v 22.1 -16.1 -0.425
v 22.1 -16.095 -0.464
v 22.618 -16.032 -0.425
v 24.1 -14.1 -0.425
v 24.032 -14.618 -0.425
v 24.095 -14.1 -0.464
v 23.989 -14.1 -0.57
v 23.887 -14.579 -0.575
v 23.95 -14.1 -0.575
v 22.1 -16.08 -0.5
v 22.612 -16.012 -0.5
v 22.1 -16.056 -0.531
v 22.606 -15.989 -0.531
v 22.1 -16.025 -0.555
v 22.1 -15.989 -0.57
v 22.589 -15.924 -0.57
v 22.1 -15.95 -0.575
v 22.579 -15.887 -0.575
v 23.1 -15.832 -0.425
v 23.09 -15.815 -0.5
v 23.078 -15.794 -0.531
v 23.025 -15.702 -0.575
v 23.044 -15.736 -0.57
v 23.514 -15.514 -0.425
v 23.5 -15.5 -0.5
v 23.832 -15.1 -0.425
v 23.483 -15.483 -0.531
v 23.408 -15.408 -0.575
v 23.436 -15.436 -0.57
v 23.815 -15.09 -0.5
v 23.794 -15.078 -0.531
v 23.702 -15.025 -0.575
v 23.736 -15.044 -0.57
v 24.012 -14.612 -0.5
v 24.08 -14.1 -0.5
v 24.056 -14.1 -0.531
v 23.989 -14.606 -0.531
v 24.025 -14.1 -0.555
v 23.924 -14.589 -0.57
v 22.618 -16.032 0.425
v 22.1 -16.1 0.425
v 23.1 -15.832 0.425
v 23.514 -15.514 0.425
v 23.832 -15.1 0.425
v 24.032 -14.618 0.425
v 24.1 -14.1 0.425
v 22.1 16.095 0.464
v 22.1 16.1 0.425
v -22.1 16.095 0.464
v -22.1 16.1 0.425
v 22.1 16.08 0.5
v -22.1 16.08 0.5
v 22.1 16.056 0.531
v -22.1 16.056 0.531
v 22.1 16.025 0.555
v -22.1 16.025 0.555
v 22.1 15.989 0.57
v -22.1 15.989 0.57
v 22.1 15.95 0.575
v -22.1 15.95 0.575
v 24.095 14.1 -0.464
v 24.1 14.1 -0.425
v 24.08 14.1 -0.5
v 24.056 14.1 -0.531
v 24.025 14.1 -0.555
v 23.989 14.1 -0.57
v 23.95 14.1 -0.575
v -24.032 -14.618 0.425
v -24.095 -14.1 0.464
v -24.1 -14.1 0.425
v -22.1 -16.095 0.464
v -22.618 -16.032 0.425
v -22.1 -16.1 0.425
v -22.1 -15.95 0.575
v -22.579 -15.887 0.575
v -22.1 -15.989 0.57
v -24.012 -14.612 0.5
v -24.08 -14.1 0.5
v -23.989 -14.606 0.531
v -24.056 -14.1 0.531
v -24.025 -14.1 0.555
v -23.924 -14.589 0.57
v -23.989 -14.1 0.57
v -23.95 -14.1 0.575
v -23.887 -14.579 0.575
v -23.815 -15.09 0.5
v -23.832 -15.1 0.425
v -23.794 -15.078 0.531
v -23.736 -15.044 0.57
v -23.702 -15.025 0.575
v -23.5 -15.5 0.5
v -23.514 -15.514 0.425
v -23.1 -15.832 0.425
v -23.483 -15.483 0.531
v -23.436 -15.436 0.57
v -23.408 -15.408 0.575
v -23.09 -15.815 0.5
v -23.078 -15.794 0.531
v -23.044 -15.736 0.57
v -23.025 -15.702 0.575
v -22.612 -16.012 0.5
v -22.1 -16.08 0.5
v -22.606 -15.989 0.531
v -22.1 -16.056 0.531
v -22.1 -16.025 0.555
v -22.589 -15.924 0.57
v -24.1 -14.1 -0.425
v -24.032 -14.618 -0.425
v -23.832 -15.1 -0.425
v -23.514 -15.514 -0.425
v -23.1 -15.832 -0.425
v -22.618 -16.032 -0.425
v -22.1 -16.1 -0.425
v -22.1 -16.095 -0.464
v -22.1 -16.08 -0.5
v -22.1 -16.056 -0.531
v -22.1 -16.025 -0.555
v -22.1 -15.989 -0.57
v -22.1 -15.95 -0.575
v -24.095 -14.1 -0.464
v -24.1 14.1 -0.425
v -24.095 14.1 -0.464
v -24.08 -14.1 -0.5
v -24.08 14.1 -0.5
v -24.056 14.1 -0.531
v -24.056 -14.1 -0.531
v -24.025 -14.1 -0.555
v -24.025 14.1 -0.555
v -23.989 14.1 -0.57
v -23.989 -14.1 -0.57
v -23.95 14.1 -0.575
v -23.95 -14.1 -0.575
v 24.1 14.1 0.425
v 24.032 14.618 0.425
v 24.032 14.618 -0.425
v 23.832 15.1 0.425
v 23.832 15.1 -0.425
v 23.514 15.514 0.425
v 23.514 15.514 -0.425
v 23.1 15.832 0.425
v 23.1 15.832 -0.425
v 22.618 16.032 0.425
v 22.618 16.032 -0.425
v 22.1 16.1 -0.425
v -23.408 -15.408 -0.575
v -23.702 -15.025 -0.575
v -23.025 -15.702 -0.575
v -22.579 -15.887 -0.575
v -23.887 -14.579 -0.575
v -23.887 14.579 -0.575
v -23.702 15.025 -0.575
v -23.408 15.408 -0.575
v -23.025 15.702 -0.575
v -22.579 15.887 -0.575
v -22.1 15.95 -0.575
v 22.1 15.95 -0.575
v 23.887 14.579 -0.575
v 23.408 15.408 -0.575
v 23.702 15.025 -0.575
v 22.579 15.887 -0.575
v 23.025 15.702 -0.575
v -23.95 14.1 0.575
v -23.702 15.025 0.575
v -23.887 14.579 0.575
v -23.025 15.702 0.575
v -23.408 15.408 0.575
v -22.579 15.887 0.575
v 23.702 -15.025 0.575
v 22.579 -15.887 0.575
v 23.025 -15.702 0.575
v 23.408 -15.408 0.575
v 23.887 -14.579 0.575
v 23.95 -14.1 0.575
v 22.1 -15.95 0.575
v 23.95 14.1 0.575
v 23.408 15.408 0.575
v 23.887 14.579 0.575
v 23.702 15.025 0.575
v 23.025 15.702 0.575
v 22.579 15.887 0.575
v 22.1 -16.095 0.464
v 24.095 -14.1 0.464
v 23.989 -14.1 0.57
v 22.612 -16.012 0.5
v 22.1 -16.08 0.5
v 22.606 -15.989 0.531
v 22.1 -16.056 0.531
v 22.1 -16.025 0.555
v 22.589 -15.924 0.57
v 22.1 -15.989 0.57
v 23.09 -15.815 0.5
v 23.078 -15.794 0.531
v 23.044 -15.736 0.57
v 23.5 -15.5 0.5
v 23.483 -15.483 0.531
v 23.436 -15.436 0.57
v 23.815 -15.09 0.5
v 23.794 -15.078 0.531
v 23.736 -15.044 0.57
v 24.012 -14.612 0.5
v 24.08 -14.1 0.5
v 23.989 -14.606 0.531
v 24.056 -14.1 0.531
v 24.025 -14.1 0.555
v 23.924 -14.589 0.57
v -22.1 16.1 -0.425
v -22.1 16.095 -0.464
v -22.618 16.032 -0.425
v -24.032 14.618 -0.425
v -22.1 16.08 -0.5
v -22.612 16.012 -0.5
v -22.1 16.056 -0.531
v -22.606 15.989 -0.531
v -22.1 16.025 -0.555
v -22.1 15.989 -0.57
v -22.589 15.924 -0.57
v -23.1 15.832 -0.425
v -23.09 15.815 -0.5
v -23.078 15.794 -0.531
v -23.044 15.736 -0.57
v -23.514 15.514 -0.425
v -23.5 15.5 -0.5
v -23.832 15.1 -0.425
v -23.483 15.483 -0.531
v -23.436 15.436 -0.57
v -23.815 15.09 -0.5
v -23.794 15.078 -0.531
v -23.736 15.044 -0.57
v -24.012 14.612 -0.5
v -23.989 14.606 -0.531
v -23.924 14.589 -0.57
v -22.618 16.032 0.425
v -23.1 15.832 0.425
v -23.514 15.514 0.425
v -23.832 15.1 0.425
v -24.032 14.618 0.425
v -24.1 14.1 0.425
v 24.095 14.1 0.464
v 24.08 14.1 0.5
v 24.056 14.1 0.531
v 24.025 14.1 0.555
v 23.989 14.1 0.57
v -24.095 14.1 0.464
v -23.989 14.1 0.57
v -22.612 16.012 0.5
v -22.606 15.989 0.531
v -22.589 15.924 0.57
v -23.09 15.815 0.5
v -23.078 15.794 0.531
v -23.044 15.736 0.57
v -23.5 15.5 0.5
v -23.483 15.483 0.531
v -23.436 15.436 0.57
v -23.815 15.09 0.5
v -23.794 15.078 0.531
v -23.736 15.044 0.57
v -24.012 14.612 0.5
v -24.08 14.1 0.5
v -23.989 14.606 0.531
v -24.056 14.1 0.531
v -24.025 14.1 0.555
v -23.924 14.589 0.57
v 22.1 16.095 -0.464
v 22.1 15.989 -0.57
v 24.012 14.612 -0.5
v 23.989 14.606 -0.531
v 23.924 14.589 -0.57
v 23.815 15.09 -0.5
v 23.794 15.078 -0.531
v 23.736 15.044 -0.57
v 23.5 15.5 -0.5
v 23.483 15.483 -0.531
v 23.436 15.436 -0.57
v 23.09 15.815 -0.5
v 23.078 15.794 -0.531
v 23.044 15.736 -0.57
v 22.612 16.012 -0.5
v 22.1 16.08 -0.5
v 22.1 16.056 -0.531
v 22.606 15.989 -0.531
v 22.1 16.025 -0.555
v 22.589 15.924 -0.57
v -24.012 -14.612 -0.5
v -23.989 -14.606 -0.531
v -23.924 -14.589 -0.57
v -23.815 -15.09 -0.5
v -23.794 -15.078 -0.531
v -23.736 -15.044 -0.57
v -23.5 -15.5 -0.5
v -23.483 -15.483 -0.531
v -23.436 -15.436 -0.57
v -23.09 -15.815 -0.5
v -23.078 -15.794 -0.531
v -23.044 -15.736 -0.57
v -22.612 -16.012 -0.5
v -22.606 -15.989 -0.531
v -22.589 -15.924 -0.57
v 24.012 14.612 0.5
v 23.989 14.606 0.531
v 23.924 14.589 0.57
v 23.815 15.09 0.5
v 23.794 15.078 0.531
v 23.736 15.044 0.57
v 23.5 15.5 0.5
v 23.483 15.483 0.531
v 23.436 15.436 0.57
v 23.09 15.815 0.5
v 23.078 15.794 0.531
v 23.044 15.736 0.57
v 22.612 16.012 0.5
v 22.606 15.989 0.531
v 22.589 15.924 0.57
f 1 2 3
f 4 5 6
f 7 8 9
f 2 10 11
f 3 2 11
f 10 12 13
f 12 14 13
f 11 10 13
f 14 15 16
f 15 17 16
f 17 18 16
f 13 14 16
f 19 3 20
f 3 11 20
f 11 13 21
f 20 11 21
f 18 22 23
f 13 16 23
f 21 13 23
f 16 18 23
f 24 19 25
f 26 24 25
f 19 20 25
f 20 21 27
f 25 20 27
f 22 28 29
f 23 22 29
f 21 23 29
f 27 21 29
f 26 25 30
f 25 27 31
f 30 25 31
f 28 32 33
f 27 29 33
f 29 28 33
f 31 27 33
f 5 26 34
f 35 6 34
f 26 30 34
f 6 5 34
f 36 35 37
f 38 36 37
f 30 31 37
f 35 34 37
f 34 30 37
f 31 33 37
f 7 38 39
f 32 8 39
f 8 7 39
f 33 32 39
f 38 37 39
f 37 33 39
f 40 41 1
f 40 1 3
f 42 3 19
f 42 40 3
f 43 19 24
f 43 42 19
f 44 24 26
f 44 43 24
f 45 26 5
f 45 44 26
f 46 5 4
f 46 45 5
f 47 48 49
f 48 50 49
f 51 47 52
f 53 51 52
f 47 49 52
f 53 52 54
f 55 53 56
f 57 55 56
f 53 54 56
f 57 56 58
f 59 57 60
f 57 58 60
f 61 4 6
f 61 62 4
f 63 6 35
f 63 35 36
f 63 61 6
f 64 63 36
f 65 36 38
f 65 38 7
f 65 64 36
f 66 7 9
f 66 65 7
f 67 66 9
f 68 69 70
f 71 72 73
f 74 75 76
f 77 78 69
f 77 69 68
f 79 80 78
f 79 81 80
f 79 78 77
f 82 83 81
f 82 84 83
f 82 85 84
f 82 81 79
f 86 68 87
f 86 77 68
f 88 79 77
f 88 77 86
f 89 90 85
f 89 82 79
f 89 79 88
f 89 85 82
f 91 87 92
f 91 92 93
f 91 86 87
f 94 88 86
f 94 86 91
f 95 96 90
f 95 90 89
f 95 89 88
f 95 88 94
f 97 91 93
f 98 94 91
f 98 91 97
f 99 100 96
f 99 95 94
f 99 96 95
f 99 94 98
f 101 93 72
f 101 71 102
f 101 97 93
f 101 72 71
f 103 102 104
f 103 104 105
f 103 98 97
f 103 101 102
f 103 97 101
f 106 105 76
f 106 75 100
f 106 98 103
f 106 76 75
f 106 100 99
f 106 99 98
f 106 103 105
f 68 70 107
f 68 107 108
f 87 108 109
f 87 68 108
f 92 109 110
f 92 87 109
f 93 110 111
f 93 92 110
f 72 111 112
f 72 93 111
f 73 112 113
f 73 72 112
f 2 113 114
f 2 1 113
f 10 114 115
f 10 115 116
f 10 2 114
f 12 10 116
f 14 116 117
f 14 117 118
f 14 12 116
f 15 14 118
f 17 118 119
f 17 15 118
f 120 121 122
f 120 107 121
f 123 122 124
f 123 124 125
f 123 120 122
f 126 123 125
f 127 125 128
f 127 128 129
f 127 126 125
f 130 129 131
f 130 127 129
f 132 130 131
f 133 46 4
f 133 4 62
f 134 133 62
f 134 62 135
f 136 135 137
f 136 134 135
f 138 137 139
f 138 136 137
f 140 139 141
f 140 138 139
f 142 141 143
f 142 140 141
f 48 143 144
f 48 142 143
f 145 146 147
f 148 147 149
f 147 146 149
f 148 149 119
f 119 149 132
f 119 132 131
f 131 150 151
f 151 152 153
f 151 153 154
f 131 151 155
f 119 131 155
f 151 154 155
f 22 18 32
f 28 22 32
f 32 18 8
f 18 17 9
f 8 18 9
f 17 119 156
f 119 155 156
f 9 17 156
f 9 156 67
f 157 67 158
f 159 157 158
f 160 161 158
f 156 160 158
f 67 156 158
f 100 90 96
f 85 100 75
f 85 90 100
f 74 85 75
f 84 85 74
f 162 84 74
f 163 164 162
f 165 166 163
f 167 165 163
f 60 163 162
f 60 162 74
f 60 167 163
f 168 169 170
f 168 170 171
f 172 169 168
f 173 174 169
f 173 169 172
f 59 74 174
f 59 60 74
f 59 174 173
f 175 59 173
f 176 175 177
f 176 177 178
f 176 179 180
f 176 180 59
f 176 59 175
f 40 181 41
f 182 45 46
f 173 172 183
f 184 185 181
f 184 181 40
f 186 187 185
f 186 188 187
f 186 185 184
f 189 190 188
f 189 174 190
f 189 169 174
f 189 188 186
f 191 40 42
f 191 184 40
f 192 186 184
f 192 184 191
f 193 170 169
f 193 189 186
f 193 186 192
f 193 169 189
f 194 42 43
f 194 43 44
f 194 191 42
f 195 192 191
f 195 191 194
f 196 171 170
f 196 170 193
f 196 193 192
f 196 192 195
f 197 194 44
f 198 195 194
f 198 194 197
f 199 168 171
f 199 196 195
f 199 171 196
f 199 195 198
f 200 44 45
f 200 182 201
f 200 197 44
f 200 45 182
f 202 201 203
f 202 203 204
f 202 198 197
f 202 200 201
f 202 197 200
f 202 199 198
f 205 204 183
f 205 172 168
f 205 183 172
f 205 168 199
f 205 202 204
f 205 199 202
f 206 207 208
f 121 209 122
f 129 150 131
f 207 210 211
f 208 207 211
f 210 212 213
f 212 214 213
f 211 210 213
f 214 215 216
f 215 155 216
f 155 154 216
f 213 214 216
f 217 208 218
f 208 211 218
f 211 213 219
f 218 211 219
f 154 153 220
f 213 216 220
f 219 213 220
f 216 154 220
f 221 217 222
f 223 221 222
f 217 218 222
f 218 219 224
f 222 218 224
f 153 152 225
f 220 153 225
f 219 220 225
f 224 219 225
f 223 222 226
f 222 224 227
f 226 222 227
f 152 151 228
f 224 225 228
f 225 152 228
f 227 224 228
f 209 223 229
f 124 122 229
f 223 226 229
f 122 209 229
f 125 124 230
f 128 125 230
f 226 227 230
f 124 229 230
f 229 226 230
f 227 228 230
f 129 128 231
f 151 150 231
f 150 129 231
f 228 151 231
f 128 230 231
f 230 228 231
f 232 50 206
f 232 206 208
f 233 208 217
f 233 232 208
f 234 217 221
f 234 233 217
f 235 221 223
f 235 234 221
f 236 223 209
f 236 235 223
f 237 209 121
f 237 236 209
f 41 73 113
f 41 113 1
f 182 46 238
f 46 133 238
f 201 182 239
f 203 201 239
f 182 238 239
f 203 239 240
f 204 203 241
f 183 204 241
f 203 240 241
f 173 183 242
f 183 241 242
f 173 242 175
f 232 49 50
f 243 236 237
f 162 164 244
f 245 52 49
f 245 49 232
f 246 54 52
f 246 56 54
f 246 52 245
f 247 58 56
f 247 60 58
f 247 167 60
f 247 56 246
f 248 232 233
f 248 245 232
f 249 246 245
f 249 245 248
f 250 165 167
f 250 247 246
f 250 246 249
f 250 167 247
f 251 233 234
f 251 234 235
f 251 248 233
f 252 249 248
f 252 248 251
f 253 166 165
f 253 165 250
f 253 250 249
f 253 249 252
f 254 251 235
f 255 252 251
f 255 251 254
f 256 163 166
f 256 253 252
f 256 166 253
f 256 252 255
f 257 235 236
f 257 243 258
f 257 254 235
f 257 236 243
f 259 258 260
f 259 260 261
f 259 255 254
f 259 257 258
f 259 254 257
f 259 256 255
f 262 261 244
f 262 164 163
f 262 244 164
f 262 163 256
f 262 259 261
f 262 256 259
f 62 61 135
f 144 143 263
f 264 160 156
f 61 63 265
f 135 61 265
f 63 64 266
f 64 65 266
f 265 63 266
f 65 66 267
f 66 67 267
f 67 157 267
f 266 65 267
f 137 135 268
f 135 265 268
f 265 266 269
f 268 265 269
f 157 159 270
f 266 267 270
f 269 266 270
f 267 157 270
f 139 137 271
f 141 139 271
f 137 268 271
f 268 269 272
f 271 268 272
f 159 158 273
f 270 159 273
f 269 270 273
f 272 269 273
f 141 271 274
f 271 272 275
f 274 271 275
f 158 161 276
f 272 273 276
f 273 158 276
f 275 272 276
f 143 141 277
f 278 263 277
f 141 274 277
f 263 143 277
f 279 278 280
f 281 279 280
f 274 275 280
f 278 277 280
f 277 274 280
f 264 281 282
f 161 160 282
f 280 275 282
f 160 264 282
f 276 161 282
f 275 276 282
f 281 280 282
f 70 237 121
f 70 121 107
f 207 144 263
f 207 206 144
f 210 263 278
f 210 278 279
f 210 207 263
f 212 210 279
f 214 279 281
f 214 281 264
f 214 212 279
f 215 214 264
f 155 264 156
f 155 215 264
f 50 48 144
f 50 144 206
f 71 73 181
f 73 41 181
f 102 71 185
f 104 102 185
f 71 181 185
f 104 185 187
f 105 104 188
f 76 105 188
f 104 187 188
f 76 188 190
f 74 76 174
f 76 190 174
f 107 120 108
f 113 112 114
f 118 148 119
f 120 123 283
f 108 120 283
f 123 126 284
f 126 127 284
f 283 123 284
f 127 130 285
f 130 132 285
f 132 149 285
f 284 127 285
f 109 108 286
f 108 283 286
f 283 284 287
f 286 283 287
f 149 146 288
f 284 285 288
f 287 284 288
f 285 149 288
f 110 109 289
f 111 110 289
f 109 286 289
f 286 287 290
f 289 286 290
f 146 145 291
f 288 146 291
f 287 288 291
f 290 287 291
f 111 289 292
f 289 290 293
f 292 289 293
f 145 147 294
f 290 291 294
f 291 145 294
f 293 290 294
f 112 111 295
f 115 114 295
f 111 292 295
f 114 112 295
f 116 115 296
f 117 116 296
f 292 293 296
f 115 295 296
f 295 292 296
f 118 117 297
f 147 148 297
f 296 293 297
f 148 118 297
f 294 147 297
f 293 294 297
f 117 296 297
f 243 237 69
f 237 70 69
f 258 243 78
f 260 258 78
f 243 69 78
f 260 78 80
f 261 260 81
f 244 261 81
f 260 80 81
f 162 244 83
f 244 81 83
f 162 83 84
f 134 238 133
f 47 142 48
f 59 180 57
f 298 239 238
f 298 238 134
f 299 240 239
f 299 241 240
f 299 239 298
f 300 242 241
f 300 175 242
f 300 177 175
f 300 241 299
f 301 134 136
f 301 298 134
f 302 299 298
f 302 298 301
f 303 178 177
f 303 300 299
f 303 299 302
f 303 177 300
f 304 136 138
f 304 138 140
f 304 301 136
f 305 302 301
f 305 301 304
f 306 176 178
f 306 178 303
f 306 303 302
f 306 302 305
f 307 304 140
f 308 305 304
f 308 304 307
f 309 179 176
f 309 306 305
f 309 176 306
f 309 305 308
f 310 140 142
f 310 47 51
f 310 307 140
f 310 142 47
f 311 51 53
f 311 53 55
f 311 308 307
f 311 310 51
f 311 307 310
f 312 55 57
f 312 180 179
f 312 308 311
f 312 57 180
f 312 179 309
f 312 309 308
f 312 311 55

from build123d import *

# Parameters (mm, degrees)
F1_DEPTH = 0.575
F2_R     = 0.15


with BuildPart() as f1:
    # F0 (on Top) → F1 (new body, symmetric)
    with BuildSketch(Plane.XY):
        with BuildLine():
            Line((-22.1, -16.1), (22.1, -16.1))
            ThreePointArc((22.1, -16.1), (23.5142135624, -15.5142135624), (24.1, -14.1))
            Line((24.1, -14.1), (24.1, 14.1))
            ThreePointArc((24.1, 14.1), (23.5142135624, 15.5142135624), (22.1, 16.1))
            Line((22.1, 16.1), (-22.1, 16.1))
            ThreePointArc((-22.1, 16.1), (-23.5142135624, 15.5142135624), (-24.1, 14.1))
            Line((-24.1, 14.1), (-24.1, -14.1))
            ThreePointArc((-24.1, -14.1), (-23.5142135624, -15.5142135624), (-22.1, -16.1))
        make_face()
    extrude(amount=F1_DEPTH, both=True)

    # F2
    f2_edges = [f1.edges().sort_by_distance(p)[0] for p in [
        (0, -16.1, -0.575),
        (23.514214, -15.514214, -0.575),
        (24.1, 0, -0.575),
        (23.514214, 15.514214, -0.575),
        (0, 16.1, -0.575),
        (-23.514214, 15.514214, -0.575),
        (-24.1, 0, -0.575),
        (-23.514214, -15.514214, -0.575),
        (0, -16.1, 0.575),
        (23.514214, -15.514214, 0.575),
        (24.1, 0, 0.575),
        (23.514214, 15.514214, 0.575),
        (0, 16.1, 0.575),
        (-23.514214, 15.514214, 0.575),
        (-24.1, 0, 0.575),
        (-23.514214, -15.514214, 0.575),
    ]]
    fillet(f2_edges, radius=F2_R)


solid = f1.part
